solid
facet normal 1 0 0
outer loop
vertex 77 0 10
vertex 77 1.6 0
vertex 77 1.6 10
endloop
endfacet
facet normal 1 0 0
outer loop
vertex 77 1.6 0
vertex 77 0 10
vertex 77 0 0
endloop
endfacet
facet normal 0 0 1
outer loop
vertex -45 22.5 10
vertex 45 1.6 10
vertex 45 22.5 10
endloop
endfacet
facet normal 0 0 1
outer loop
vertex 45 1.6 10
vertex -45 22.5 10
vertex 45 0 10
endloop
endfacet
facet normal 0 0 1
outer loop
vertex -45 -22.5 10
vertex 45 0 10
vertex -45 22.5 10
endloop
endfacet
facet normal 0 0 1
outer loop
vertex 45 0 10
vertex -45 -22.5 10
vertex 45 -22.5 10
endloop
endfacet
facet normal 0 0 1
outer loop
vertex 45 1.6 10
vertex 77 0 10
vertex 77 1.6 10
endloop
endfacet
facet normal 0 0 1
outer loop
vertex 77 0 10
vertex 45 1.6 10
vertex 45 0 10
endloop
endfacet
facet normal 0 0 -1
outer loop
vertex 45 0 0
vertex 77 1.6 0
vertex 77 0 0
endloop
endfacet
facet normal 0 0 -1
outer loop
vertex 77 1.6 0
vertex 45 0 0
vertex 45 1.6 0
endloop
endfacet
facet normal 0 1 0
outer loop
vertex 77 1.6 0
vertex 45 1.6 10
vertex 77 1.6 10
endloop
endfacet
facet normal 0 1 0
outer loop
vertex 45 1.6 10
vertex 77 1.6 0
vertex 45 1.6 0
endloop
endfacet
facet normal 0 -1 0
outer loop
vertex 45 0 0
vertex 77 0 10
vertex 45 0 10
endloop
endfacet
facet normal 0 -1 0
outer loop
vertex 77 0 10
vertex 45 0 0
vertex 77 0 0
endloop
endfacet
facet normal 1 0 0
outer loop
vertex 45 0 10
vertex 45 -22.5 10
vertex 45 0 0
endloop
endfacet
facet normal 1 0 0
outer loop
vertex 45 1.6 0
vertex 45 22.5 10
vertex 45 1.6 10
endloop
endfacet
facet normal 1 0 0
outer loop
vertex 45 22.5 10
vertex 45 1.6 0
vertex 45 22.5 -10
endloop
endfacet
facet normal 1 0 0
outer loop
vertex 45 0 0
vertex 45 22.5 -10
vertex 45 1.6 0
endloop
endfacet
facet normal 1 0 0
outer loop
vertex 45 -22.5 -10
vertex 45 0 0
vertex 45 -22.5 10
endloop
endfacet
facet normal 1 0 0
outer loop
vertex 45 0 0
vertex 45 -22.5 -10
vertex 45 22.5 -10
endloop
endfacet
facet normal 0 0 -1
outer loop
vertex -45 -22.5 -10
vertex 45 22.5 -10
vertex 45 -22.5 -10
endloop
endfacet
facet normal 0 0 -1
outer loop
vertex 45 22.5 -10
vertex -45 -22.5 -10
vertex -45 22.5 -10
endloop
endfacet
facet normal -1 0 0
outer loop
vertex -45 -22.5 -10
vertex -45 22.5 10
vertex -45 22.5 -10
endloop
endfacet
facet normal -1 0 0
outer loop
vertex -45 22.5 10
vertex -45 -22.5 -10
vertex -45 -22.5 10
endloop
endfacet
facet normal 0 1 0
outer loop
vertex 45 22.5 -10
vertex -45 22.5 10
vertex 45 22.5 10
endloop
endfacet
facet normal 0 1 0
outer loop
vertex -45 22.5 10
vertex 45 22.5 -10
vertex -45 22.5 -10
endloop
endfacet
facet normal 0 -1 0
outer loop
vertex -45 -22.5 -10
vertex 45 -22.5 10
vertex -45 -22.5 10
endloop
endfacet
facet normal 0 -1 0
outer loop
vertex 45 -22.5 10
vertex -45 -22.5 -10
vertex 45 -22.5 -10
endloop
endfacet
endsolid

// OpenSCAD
// Dimensions for the Drying Rack
// Base Block Dimensions
base_length = 90;  // Length of the base block along X axis (mm)
base_width = 45;    // Width of the base block along Y axis (mm)
base_height = 20;   // Height of the base block along Z axis (mm)

// Slide Slot Dimensions
num_slots = 10;     // Number of slots to create
slot_length = 77;   // Length of each slot along X axis (mm)
slot_width = 1.6;    // Width of each slot along Y axis (mm)
slot_depth = 10;     // Depth of the slot along Z axis (mm)
slot_spacing = 3.5;  // Center-to-center spacing between slots in Y direction (mm)

// Slot Positioning Calculations
// The slots are centered on the block in X and Y.

// Calculate the total required width for the slots and gaps:
// Total span occupied by slots and gaps along Y axis:
// Span = (num_slots - 1) * slot_spacing + slot_width
total_span = (num_slots - 1) * slot_spacing + slot_width;

// Center of the block in Y: base_width / 2 = 45 / 2 = 22.5
y_center = base_width / 2;

// Calculate the starting position for the first slot's center (relative to origin)
start_y = y_center - (total_span / 2);

slot_positions = [];
for (i = [0 : num_slots - 1]) {
    // Center of the i-th slot: start_y + i * slot_spacing + slot_width / 2
    pos = start_y + i * slot_spacing + (slot_width / 2);
    slot_positions = concat(slot_positions, [pos]);
}


// --- Main Model ---

module drying_rack() {
    // 1. Base Block (Cuboid)
    // The block rests on the XY plane at z=0.
    cube([base_length, base_width, base_height], center = true);

    // 2. Slots (Cutouts)
    for (i = [0 : num_slots - 1]) {
        slot_y = slot_positions[i];

        // Create the slot using a moving cube/box for extrusion along Z
        translate([0, slot_y, 0]) {
            // The slot runs along X (length=77), has width=1.6 (Y), and depth=10 (Z)
            cube([slot_length, slot_width, slot_depth], center = false);
        }
    }
}

drying_rack();
